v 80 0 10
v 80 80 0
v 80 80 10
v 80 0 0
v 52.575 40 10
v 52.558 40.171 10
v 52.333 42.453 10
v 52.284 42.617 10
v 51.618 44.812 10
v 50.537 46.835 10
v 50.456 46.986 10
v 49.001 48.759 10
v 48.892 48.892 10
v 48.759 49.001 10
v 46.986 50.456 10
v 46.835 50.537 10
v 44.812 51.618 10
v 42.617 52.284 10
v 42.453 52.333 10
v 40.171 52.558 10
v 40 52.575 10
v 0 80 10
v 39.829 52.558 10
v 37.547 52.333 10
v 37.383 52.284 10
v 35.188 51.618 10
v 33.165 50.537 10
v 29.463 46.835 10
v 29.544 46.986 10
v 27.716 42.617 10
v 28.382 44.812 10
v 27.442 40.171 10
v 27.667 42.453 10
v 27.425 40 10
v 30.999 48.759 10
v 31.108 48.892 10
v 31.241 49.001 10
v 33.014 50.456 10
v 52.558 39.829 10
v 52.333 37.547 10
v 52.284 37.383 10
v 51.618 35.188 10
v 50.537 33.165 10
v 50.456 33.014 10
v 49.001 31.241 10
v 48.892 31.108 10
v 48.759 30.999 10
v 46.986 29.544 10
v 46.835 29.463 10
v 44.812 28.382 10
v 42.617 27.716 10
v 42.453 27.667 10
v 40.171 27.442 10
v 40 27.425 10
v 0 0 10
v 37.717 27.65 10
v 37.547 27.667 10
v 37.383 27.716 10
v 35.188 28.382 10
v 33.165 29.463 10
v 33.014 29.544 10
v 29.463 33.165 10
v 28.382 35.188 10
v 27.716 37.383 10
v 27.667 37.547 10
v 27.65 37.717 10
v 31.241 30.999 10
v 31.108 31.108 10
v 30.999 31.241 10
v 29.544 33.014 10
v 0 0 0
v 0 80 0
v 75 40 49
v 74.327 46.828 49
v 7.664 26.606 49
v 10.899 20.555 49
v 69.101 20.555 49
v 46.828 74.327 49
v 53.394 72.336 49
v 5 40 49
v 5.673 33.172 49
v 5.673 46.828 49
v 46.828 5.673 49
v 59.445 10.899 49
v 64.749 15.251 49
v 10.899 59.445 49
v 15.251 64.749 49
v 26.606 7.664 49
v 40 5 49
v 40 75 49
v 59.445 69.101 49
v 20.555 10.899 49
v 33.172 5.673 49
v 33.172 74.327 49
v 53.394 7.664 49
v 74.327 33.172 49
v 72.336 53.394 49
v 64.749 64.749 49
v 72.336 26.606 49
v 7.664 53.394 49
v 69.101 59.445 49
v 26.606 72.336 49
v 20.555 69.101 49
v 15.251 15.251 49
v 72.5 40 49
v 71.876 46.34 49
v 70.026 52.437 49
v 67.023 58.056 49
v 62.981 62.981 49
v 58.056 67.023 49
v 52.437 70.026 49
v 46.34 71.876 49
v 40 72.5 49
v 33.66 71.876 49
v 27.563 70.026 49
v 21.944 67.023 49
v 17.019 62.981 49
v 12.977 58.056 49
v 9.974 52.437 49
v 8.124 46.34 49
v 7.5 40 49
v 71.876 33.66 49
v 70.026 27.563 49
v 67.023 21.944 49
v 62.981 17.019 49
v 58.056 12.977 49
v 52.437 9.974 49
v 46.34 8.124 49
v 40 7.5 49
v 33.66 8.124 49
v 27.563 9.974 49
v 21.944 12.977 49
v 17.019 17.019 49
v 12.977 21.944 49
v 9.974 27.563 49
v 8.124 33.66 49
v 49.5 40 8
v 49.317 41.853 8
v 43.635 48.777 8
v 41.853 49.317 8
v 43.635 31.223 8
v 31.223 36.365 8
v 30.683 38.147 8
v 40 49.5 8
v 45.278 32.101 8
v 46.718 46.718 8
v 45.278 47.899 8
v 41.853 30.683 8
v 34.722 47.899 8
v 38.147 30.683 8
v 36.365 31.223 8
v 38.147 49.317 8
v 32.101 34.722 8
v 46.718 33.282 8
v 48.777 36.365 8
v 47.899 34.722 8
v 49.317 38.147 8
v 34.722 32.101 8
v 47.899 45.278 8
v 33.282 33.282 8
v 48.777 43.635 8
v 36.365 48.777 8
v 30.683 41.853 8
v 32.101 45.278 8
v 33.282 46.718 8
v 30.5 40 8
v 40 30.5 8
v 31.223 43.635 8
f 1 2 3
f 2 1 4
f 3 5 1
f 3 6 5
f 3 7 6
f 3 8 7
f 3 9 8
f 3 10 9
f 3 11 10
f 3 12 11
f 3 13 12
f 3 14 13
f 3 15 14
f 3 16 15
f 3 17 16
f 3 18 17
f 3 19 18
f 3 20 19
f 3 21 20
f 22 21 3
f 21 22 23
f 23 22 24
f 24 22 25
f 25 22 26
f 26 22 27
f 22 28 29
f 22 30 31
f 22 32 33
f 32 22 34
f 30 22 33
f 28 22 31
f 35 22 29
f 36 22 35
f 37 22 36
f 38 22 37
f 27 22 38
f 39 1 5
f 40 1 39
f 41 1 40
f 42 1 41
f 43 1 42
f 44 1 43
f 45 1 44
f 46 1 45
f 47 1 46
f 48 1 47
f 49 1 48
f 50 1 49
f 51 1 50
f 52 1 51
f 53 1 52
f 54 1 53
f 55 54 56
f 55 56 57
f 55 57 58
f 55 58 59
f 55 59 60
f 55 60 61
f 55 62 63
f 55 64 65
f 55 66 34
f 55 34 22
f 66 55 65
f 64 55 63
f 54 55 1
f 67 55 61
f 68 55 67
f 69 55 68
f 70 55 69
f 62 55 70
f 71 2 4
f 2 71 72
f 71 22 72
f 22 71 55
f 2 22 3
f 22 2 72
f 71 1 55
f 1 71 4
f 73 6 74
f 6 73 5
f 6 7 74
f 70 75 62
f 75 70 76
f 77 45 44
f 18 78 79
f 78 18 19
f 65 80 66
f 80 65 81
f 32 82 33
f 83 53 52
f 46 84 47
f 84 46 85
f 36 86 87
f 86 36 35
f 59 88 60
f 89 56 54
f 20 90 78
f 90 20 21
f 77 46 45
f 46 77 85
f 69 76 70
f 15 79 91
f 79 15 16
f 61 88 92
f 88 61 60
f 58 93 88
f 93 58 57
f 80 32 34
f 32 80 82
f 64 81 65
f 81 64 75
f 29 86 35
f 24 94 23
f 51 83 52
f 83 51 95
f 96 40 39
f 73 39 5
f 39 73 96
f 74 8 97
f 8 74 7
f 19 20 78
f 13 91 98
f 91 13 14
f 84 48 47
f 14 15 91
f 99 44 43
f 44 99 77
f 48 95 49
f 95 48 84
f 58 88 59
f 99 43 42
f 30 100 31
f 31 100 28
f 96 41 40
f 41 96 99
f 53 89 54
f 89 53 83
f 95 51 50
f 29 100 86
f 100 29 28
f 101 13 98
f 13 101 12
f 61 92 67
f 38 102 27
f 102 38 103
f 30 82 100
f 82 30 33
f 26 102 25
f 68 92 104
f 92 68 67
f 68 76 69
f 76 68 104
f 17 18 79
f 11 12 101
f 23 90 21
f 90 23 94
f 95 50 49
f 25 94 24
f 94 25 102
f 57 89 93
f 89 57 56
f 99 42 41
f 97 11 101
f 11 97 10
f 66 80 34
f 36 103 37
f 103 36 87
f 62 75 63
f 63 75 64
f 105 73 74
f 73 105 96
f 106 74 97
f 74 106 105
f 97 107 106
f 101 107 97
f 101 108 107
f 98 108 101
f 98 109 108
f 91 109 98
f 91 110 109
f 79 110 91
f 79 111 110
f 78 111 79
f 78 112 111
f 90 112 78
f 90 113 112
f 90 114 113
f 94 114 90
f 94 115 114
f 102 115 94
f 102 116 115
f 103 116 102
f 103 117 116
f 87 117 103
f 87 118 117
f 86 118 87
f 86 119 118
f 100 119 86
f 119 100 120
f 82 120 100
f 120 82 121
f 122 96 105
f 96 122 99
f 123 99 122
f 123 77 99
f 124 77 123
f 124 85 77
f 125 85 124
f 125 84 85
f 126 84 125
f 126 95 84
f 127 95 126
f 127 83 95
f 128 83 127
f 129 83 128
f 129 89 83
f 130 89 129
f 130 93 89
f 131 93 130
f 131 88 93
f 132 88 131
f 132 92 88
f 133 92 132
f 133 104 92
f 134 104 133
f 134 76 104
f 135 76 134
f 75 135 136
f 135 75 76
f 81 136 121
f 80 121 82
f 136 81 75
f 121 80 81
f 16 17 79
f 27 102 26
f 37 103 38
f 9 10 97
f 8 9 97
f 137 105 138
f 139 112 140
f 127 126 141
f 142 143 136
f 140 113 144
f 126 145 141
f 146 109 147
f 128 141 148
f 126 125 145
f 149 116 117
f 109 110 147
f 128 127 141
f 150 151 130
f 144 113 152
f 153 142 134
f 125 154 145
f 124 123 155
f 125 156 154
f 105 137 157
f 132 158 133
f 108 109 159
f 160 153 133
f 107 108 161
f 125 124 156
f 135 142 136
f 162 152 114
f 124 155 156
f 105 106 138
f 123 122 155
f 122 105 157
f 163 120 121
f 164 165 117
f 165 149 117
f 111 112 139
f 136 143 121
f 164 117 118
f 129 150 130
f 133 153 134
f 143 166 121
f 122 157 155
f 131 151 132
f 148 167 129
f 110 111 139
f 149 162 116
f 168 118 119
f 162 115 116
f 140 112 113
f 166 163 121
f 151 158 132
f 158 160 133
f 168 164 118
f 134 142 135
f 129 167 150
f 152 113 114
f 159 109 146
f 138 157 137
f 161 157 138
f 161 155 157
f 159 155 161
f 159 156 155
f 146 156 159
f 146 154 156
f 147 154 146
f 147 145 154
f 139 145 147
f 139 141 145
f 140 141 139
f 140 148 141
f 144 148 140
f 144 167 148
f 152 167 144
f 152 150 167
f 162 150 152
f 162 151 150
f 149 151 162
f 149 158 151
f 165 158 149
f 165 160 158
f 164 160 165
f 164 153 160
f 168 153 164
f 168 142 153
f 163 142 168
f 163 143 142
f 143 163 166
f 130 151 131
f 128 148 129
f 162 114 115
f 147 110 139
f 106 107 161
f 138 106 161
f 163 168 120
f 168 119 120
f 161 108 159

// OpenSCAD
$fn = 32;

// ----------------------------------------------------------------------
// Hopper: funnel with square flange
// ----------------------------------------------------------------------

// --- parameters (mm) ---
fl = 80;                  // flange side, X and Y
fl_t = 10;                // flange thickness
cone_h = 40;              // cone height above the flange
top_d = 70;               // cone mouth diameter
bot_d = 24;               // cone spout diameter
wall = 2.5;               // cone wall thickness

bore_d = bot_d - 2 * wall;  // spout bore diameter
total_h = fl_t + cone_h - 1;  // overall height

difference() {
  union() {
    cube([fl, fl, fl_t]);
    translate([fl / 2, fl / 2, fl_t - 1])
      cylinder(h = cone_h, d1 = bot_d, d2 = top_d);
  }
  translate([fl / 2, fl / 2, fl_t - 2])
    cylinder(h = cone_h + 1, d1 = bore_d, d2 = top_d - 2 * wall);
}
